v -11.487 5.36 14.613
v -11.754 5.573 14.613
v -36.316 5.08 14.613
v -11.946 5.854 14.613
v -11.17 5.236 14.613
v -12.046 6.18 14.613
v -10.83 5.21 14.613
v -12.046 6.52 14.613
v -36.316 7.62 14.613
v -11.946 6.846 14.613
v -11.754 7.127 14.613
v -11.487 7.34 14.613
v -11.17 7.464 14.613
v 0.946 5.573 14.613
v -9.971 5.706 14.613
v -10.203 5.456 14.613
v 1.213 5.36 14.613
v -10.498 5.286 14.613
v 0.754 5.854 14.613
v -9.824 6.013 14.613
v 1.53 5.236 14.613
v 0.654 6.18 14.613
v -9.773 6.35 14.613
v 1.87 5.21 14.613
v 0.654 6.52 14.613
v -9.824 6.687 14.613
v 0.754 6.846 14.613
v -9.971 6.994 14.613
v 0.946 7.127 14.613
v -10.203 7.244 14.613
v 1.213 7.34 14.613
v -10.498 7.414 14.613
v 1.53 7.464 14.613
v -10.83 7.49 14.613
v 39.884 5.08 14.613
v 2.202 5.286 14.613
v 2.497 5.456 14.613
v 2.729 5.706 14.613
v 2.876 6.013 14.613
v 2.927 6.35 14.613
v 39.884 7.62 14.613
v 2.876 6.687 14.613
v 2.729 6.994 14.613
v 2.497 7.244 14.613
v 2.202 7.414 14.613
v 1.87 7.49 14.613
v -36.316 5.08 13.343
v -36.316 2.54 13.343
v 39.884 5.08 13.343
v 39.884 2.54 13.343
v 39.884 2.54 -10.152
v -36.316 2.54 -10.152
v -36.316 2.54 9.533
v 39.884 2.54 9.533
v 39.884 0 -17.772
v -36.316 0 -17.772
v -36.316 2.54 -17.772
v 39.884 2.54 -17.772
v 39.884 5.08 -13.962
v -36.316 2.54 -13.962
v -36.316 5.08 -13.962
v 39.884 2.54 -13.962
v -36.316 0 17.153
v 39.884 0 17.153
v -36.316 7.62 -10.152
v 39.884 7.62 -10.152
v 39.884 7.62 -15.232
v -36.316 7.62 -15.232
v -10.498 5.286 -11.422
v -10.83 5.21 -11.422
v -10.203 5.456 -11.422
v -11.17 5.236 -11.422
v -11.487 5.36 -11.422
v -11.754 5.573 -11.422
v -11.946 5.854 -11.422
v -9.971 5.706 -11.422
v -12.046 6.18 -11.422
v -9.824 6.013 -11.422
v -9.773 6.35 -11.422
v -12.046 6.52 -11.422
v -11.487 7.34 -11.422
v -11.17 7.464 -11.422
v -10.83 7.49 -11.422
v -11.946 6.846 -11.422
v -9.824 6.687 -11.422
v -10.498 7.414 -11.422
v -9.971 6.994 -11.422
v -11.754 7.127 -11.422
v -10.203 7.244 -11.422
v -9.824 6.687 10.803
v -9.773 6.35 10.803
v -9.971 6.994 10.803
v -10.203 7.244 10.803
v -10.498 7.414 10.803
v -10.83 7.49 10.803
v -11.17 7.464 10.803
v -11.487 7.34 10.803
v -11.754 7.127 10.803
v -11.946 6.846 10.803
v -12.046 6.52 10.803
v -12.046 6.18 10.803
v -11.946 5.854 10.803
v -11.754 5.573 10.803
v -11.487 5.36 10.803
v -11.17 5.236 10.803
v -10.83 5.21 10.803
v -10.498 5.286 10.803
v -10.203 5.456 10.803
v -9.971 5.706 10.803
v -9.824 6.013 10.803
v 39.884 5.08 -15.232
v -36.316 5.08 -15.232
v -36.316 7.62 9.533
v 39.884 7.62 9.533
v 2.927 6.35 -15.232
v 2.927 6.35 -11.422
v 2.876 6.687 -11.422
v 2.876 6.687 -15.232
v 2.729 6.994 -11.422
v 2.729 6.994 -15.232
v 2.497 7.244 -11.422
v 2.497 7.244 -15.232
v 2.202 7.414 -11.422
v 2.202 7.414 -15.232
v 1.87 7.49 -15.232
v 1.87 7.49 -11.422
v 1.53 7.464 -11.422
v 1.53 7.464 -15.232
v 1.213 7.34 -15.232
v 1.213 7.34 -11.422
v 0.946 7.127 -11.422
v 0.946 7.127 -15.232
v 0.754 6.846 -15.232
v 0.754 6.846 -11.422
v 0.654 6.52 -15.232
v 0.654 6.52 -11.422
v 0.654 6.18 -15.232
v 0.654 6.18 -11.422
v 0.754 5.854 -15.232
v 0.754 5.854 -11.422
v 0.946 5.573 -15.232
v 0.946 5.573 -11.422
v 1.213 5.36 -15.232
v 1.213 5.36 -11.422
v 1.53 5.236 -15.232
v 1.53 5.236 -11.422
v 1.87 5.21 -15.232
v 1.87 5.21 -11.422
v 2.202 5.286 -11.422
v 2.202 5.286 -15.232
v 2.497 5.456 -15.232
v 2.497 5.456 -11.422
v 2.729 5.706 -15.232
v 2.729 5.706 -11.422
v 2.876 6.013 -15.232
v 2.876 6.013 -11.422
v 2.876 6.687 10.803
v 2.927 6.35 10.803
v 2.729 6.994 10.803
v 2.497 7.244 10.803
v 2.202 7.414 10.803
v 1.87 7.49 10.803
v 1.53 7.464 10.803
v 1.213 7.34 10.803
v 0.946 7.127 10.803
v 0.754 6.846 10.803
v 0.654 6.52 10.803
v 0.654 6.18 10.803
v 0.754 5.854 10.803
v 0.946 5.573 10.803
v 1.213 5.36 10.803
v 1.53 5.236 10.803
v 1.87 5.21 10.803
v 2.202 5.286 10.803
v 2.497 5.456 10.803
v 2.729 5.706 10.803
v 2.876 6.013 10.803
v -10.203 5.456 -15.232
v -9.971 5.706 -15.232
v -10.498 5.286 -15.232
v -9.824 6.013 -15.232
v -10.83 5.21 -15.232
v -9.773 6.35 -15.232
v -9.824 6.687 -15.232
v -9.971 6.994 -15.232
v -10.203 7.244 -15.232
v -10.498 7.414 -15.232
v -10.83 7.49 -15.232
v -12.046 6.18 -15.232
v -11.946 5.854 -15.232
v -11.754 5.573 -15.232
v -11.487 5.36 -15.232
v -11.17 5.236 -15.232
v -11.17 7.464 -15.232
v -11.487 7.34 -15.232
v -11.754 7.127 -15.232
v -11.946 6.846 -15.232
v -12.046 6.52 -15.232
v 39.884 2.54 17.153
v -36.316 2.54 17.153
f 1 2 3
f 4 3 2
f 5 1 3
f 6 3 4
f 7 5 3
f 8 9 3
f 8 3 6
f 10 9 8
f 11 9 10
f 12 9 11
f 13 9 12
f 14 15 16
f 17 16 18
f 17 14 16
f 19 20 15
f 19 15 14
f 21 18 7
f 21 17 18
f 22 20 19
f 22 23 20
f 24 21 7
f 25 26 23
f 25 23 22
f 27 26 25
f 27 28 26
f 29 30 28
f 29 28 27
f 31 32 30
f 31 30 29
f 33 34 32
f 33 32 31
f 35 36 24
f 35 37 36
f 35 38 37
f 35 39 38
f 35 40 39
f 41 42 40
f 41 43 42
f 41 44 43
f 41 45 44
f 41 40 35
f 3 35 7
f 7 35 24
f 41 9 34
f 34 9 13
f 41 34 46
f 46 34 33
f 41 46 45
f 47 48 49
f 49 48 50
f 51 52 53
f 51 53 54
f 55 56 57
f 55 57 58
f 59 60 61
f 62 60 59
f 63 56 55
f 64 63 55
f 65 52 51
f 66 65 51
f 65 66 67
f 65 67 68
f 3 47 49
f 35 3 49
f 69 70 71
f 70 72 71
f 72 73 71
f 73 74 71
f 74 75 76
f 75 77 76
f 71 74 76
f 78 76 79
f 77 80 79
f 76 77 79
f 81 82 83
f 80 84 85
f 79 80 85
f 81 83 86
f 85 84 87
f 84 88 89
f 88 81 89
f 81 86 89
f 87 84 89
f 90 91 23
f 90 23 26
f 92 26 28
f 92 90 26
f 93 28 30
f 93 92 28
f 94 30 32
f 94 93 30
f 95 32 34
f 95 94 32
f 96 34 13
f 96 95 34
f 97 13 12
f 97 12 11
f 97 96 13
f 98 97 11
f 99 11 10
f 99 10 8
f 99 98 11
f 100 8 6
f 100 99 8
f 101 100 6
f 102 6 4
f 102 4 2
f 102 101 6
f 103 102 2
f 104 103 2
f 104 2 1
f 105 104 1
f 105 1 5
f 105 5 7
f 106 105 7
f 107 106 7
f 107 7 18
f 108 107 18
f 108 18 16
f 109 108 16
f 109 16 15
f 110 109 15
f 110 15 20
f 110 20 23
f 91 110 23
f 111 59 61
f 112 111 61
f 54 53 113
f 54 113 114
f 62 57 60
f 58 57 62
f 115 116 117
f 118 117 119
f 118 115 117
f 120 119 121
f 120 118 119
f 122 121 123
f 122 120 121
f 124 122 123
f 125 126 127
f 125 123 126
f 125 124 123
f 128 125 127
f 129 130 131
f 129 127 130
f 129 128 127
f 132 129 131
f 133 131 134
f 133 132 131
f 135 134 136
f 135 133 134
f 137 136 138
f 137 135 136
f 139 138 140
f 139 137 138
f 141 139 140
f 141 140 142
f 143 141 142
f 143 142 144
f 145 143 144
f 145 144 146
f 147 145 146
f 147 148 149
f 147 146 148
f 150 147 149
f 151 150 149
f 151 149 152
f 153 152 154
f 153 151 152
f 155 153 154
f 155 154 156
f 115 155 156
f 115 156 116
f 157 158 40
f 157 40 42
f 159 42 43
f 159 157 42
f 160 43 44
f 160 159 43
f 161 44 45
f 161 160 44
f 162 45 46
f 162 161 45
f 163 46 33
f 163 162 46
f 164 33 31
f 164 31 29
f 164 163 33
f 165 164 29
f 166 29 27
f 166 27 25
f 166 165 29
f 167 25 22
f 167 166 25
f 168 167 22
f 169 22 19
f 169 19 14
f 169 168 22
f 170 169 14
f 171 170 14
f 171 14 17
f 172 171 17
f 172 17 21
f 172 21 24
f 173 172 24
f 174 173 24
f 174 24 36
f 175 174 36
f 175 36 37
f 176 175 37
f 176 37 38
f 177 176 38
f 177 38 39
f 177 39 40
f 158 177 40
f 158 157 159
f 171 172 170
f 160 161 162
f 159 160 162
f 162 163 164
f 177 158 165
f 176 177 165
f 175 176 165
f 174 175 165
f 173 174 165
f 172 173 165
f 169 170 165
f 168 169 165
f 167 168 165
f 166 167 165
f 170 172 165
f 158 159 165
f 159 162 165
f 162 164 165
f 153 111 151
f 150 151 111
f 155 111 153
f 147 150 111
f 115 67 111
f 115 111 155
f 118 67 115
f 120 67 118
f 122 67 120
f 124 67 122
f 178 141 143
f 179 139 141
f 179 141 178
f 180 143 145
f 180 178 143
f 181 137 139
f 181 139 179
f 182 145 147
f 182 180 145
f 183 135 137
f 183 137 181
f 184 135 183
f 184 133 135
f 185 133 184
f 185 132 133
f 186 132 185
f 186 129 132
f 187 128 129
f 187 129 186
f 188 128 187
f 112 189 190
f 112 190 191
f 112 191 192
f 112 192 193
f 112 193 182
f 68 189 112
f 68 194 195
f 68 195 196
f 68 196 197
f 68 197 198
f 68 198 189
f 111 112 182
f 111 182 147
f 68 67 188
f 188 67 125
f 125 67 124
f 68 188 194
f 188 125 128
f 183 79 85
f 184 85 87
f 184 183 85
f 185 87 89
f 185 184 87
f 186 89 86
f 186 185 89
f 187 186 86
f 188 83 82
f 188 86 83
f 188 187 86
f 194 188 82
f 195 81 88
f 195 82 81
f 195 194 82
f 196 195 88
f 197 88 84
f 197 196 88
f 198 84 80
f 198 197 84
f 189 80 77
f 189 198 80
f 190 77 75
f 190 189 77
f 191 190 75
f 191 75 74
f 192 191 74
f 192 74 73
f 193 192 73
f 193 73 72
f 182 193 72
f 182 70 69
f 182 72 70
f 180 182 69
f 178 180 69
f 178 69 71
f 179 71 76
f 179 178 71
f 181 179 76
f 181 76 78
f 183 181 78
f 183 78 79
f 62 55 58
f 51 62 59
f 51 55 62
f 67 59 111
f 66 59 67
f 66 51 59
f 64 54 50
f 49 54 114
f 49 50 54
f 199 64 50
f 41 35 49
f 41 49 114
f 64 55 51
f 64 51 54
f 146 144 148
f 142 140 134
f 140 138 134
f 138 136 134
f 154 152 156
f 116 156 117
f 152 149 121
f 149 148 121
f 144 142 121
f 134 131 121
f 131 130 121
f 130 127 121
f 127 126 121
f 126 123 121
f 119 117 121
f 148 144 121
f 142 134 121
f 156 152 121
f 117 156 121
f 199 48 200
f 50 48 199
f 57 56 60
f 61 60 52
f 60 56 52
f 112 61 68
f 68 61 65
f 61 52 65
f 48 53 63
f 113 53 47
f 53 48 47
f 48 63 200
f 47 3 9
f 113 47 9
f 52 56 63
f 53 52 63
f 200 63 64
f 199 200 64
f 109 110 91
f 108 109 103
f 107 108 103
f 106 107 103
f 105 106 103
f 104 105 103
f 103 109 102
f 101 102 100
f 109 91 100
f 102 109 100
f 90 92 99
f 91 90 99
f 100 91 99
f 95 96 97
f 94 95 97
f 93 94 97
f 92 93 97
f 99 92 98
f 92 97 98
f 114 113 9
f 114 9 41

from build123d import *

# Parameters (mm, degrees)
SKETCH1_W               = 76.2
SKETCH1_H               = 34.925
BOSS_EXTRUDE1_DEPTH     = 2.54
SKETCH3_W               = 76.2
SKETCH3_H               = 3.81
BOSS_EXTRUDE3_DEPTH     = 5.08
SKETCH6_W               = 76.2
SKETCH6_H               = 2.54
BOSS_EXTRUDE4_DEPTH     = 1.27
SKETCH7_W               = 76.2
SKETCH7_H               = 2.54
BOSS_EXTRUDE5_DEPTH     = 1.27
FILL_START              = -15.231570796
FILL_PATTERN1_OUTLINE_R = 1.143
FILL_PATTERN1_DEPTH     = 29.845
SKETCH8_W               = 76.2
SKETCH8_H               = 2.54
BOSS_EXTRUDE6_DEPTH     = 1.27
SKETCH9_W               = 76.2
SKETCH9_H               = 2.54
BOSS_EXTRUDE7_DEPTH     = 1.27


# Read off the part's stored shape, not the designer's step: Fill Pattern1
with BuildPart() as part:
    # Sketch1 → Boss-Extrude1 (new body)
    with BuildSketch(Plane(origin=(0, 0, 0), x_dir=(1, 0, 0), z_dir=(0, 1, 0))):
        with Locations((1.784181416, 0.309070796)):
            Rectangle(SKETCH1_W, SKETCH1_H)
    extrude(amount=BOSS_EXTRUDE1_DEPTH)

    # Sketch3 → Boss-Extrude3 (add)
    with BuildSketch(Plane(origin=(0, 2.54, 0), x_dir=(1, 0, 0), z_dir=(0, 1, 0))):
        with Locations((1.784181416, 12.056570796)):
            Rectangle(SKETCH3_W, SKETCH3_H)
        with Locations((1.784181416, -11.438429204)):
            Rectangle(SKETCH3_W, SKETCH3_H)
    extrude(amount=BOSS_EXTRUDE3_DEPTH)

    # Sketch6 → Boss-Extrude4 (add)
    with BuildSketch(Plane.XY.offset(13.343429204)):
        with Locations((1.784181416, 6.35)):
            Rectangle(SKETCH6_W, SKETCH6_H)
    extrude(amount=BOSS_EXTRUDE4_DEPTH)

    # Sketch7 → Boss-Extrude5 (add)
    with BuildSketch(Plane(origin=(0, 0, -13.961570796), x_dir=(-1, 0, 0), z_dir=(0, 0, -1))):
        with Locations((-1.784181416, 6.35)):
            Rectangle(SKETCH7_W, SKETCH7_H)
    extrude(amount=BOSS_EXTRUDE5_DEPTH)

    # Fill Pattern1 outline → Fill Pattern1 (cut)
    with BuildSketch(Plane.XY.offset(FILL_START)):
        with Locations((1.784181416, 6.35)):
            Circle(FILL_PATTERN1_OUTLINE_R)
        with Locations((-10.915818584, 6.35)):
            Circle(FILL_PATTERN1_OUTLINE_R)
    extrude(amount=FILL_PATTERN1_DEPTH, mode=Mode.SUBTRACT)

    # Sketch8 → Boss-Extrude6 (add)
    with BuildSketch(Plane(origin=(0, 0, 9.533429204), x_dir=(-1, 0, 0), z_dir=(0, 0, -1))):
        with Locations((-1.784181416, 6.35)):
            Rectangle(SKETCH8_W, SKETCH8_H)
    extrude(amount=-BOSS_EXTRUDE6_DEPTH)

    # Sketch9 → Boss-Extrude7 (add)
    with BuildSketch(Plane.XY.offset(-10.151570796)):
        with Locations((1.784181416, 6.35)):
            Rectangle(SKETCH9_W, SKETCH9_H)
    extrude(amount=-BOSS_EXTRUDE7_DEPTH)


solid = part.part
